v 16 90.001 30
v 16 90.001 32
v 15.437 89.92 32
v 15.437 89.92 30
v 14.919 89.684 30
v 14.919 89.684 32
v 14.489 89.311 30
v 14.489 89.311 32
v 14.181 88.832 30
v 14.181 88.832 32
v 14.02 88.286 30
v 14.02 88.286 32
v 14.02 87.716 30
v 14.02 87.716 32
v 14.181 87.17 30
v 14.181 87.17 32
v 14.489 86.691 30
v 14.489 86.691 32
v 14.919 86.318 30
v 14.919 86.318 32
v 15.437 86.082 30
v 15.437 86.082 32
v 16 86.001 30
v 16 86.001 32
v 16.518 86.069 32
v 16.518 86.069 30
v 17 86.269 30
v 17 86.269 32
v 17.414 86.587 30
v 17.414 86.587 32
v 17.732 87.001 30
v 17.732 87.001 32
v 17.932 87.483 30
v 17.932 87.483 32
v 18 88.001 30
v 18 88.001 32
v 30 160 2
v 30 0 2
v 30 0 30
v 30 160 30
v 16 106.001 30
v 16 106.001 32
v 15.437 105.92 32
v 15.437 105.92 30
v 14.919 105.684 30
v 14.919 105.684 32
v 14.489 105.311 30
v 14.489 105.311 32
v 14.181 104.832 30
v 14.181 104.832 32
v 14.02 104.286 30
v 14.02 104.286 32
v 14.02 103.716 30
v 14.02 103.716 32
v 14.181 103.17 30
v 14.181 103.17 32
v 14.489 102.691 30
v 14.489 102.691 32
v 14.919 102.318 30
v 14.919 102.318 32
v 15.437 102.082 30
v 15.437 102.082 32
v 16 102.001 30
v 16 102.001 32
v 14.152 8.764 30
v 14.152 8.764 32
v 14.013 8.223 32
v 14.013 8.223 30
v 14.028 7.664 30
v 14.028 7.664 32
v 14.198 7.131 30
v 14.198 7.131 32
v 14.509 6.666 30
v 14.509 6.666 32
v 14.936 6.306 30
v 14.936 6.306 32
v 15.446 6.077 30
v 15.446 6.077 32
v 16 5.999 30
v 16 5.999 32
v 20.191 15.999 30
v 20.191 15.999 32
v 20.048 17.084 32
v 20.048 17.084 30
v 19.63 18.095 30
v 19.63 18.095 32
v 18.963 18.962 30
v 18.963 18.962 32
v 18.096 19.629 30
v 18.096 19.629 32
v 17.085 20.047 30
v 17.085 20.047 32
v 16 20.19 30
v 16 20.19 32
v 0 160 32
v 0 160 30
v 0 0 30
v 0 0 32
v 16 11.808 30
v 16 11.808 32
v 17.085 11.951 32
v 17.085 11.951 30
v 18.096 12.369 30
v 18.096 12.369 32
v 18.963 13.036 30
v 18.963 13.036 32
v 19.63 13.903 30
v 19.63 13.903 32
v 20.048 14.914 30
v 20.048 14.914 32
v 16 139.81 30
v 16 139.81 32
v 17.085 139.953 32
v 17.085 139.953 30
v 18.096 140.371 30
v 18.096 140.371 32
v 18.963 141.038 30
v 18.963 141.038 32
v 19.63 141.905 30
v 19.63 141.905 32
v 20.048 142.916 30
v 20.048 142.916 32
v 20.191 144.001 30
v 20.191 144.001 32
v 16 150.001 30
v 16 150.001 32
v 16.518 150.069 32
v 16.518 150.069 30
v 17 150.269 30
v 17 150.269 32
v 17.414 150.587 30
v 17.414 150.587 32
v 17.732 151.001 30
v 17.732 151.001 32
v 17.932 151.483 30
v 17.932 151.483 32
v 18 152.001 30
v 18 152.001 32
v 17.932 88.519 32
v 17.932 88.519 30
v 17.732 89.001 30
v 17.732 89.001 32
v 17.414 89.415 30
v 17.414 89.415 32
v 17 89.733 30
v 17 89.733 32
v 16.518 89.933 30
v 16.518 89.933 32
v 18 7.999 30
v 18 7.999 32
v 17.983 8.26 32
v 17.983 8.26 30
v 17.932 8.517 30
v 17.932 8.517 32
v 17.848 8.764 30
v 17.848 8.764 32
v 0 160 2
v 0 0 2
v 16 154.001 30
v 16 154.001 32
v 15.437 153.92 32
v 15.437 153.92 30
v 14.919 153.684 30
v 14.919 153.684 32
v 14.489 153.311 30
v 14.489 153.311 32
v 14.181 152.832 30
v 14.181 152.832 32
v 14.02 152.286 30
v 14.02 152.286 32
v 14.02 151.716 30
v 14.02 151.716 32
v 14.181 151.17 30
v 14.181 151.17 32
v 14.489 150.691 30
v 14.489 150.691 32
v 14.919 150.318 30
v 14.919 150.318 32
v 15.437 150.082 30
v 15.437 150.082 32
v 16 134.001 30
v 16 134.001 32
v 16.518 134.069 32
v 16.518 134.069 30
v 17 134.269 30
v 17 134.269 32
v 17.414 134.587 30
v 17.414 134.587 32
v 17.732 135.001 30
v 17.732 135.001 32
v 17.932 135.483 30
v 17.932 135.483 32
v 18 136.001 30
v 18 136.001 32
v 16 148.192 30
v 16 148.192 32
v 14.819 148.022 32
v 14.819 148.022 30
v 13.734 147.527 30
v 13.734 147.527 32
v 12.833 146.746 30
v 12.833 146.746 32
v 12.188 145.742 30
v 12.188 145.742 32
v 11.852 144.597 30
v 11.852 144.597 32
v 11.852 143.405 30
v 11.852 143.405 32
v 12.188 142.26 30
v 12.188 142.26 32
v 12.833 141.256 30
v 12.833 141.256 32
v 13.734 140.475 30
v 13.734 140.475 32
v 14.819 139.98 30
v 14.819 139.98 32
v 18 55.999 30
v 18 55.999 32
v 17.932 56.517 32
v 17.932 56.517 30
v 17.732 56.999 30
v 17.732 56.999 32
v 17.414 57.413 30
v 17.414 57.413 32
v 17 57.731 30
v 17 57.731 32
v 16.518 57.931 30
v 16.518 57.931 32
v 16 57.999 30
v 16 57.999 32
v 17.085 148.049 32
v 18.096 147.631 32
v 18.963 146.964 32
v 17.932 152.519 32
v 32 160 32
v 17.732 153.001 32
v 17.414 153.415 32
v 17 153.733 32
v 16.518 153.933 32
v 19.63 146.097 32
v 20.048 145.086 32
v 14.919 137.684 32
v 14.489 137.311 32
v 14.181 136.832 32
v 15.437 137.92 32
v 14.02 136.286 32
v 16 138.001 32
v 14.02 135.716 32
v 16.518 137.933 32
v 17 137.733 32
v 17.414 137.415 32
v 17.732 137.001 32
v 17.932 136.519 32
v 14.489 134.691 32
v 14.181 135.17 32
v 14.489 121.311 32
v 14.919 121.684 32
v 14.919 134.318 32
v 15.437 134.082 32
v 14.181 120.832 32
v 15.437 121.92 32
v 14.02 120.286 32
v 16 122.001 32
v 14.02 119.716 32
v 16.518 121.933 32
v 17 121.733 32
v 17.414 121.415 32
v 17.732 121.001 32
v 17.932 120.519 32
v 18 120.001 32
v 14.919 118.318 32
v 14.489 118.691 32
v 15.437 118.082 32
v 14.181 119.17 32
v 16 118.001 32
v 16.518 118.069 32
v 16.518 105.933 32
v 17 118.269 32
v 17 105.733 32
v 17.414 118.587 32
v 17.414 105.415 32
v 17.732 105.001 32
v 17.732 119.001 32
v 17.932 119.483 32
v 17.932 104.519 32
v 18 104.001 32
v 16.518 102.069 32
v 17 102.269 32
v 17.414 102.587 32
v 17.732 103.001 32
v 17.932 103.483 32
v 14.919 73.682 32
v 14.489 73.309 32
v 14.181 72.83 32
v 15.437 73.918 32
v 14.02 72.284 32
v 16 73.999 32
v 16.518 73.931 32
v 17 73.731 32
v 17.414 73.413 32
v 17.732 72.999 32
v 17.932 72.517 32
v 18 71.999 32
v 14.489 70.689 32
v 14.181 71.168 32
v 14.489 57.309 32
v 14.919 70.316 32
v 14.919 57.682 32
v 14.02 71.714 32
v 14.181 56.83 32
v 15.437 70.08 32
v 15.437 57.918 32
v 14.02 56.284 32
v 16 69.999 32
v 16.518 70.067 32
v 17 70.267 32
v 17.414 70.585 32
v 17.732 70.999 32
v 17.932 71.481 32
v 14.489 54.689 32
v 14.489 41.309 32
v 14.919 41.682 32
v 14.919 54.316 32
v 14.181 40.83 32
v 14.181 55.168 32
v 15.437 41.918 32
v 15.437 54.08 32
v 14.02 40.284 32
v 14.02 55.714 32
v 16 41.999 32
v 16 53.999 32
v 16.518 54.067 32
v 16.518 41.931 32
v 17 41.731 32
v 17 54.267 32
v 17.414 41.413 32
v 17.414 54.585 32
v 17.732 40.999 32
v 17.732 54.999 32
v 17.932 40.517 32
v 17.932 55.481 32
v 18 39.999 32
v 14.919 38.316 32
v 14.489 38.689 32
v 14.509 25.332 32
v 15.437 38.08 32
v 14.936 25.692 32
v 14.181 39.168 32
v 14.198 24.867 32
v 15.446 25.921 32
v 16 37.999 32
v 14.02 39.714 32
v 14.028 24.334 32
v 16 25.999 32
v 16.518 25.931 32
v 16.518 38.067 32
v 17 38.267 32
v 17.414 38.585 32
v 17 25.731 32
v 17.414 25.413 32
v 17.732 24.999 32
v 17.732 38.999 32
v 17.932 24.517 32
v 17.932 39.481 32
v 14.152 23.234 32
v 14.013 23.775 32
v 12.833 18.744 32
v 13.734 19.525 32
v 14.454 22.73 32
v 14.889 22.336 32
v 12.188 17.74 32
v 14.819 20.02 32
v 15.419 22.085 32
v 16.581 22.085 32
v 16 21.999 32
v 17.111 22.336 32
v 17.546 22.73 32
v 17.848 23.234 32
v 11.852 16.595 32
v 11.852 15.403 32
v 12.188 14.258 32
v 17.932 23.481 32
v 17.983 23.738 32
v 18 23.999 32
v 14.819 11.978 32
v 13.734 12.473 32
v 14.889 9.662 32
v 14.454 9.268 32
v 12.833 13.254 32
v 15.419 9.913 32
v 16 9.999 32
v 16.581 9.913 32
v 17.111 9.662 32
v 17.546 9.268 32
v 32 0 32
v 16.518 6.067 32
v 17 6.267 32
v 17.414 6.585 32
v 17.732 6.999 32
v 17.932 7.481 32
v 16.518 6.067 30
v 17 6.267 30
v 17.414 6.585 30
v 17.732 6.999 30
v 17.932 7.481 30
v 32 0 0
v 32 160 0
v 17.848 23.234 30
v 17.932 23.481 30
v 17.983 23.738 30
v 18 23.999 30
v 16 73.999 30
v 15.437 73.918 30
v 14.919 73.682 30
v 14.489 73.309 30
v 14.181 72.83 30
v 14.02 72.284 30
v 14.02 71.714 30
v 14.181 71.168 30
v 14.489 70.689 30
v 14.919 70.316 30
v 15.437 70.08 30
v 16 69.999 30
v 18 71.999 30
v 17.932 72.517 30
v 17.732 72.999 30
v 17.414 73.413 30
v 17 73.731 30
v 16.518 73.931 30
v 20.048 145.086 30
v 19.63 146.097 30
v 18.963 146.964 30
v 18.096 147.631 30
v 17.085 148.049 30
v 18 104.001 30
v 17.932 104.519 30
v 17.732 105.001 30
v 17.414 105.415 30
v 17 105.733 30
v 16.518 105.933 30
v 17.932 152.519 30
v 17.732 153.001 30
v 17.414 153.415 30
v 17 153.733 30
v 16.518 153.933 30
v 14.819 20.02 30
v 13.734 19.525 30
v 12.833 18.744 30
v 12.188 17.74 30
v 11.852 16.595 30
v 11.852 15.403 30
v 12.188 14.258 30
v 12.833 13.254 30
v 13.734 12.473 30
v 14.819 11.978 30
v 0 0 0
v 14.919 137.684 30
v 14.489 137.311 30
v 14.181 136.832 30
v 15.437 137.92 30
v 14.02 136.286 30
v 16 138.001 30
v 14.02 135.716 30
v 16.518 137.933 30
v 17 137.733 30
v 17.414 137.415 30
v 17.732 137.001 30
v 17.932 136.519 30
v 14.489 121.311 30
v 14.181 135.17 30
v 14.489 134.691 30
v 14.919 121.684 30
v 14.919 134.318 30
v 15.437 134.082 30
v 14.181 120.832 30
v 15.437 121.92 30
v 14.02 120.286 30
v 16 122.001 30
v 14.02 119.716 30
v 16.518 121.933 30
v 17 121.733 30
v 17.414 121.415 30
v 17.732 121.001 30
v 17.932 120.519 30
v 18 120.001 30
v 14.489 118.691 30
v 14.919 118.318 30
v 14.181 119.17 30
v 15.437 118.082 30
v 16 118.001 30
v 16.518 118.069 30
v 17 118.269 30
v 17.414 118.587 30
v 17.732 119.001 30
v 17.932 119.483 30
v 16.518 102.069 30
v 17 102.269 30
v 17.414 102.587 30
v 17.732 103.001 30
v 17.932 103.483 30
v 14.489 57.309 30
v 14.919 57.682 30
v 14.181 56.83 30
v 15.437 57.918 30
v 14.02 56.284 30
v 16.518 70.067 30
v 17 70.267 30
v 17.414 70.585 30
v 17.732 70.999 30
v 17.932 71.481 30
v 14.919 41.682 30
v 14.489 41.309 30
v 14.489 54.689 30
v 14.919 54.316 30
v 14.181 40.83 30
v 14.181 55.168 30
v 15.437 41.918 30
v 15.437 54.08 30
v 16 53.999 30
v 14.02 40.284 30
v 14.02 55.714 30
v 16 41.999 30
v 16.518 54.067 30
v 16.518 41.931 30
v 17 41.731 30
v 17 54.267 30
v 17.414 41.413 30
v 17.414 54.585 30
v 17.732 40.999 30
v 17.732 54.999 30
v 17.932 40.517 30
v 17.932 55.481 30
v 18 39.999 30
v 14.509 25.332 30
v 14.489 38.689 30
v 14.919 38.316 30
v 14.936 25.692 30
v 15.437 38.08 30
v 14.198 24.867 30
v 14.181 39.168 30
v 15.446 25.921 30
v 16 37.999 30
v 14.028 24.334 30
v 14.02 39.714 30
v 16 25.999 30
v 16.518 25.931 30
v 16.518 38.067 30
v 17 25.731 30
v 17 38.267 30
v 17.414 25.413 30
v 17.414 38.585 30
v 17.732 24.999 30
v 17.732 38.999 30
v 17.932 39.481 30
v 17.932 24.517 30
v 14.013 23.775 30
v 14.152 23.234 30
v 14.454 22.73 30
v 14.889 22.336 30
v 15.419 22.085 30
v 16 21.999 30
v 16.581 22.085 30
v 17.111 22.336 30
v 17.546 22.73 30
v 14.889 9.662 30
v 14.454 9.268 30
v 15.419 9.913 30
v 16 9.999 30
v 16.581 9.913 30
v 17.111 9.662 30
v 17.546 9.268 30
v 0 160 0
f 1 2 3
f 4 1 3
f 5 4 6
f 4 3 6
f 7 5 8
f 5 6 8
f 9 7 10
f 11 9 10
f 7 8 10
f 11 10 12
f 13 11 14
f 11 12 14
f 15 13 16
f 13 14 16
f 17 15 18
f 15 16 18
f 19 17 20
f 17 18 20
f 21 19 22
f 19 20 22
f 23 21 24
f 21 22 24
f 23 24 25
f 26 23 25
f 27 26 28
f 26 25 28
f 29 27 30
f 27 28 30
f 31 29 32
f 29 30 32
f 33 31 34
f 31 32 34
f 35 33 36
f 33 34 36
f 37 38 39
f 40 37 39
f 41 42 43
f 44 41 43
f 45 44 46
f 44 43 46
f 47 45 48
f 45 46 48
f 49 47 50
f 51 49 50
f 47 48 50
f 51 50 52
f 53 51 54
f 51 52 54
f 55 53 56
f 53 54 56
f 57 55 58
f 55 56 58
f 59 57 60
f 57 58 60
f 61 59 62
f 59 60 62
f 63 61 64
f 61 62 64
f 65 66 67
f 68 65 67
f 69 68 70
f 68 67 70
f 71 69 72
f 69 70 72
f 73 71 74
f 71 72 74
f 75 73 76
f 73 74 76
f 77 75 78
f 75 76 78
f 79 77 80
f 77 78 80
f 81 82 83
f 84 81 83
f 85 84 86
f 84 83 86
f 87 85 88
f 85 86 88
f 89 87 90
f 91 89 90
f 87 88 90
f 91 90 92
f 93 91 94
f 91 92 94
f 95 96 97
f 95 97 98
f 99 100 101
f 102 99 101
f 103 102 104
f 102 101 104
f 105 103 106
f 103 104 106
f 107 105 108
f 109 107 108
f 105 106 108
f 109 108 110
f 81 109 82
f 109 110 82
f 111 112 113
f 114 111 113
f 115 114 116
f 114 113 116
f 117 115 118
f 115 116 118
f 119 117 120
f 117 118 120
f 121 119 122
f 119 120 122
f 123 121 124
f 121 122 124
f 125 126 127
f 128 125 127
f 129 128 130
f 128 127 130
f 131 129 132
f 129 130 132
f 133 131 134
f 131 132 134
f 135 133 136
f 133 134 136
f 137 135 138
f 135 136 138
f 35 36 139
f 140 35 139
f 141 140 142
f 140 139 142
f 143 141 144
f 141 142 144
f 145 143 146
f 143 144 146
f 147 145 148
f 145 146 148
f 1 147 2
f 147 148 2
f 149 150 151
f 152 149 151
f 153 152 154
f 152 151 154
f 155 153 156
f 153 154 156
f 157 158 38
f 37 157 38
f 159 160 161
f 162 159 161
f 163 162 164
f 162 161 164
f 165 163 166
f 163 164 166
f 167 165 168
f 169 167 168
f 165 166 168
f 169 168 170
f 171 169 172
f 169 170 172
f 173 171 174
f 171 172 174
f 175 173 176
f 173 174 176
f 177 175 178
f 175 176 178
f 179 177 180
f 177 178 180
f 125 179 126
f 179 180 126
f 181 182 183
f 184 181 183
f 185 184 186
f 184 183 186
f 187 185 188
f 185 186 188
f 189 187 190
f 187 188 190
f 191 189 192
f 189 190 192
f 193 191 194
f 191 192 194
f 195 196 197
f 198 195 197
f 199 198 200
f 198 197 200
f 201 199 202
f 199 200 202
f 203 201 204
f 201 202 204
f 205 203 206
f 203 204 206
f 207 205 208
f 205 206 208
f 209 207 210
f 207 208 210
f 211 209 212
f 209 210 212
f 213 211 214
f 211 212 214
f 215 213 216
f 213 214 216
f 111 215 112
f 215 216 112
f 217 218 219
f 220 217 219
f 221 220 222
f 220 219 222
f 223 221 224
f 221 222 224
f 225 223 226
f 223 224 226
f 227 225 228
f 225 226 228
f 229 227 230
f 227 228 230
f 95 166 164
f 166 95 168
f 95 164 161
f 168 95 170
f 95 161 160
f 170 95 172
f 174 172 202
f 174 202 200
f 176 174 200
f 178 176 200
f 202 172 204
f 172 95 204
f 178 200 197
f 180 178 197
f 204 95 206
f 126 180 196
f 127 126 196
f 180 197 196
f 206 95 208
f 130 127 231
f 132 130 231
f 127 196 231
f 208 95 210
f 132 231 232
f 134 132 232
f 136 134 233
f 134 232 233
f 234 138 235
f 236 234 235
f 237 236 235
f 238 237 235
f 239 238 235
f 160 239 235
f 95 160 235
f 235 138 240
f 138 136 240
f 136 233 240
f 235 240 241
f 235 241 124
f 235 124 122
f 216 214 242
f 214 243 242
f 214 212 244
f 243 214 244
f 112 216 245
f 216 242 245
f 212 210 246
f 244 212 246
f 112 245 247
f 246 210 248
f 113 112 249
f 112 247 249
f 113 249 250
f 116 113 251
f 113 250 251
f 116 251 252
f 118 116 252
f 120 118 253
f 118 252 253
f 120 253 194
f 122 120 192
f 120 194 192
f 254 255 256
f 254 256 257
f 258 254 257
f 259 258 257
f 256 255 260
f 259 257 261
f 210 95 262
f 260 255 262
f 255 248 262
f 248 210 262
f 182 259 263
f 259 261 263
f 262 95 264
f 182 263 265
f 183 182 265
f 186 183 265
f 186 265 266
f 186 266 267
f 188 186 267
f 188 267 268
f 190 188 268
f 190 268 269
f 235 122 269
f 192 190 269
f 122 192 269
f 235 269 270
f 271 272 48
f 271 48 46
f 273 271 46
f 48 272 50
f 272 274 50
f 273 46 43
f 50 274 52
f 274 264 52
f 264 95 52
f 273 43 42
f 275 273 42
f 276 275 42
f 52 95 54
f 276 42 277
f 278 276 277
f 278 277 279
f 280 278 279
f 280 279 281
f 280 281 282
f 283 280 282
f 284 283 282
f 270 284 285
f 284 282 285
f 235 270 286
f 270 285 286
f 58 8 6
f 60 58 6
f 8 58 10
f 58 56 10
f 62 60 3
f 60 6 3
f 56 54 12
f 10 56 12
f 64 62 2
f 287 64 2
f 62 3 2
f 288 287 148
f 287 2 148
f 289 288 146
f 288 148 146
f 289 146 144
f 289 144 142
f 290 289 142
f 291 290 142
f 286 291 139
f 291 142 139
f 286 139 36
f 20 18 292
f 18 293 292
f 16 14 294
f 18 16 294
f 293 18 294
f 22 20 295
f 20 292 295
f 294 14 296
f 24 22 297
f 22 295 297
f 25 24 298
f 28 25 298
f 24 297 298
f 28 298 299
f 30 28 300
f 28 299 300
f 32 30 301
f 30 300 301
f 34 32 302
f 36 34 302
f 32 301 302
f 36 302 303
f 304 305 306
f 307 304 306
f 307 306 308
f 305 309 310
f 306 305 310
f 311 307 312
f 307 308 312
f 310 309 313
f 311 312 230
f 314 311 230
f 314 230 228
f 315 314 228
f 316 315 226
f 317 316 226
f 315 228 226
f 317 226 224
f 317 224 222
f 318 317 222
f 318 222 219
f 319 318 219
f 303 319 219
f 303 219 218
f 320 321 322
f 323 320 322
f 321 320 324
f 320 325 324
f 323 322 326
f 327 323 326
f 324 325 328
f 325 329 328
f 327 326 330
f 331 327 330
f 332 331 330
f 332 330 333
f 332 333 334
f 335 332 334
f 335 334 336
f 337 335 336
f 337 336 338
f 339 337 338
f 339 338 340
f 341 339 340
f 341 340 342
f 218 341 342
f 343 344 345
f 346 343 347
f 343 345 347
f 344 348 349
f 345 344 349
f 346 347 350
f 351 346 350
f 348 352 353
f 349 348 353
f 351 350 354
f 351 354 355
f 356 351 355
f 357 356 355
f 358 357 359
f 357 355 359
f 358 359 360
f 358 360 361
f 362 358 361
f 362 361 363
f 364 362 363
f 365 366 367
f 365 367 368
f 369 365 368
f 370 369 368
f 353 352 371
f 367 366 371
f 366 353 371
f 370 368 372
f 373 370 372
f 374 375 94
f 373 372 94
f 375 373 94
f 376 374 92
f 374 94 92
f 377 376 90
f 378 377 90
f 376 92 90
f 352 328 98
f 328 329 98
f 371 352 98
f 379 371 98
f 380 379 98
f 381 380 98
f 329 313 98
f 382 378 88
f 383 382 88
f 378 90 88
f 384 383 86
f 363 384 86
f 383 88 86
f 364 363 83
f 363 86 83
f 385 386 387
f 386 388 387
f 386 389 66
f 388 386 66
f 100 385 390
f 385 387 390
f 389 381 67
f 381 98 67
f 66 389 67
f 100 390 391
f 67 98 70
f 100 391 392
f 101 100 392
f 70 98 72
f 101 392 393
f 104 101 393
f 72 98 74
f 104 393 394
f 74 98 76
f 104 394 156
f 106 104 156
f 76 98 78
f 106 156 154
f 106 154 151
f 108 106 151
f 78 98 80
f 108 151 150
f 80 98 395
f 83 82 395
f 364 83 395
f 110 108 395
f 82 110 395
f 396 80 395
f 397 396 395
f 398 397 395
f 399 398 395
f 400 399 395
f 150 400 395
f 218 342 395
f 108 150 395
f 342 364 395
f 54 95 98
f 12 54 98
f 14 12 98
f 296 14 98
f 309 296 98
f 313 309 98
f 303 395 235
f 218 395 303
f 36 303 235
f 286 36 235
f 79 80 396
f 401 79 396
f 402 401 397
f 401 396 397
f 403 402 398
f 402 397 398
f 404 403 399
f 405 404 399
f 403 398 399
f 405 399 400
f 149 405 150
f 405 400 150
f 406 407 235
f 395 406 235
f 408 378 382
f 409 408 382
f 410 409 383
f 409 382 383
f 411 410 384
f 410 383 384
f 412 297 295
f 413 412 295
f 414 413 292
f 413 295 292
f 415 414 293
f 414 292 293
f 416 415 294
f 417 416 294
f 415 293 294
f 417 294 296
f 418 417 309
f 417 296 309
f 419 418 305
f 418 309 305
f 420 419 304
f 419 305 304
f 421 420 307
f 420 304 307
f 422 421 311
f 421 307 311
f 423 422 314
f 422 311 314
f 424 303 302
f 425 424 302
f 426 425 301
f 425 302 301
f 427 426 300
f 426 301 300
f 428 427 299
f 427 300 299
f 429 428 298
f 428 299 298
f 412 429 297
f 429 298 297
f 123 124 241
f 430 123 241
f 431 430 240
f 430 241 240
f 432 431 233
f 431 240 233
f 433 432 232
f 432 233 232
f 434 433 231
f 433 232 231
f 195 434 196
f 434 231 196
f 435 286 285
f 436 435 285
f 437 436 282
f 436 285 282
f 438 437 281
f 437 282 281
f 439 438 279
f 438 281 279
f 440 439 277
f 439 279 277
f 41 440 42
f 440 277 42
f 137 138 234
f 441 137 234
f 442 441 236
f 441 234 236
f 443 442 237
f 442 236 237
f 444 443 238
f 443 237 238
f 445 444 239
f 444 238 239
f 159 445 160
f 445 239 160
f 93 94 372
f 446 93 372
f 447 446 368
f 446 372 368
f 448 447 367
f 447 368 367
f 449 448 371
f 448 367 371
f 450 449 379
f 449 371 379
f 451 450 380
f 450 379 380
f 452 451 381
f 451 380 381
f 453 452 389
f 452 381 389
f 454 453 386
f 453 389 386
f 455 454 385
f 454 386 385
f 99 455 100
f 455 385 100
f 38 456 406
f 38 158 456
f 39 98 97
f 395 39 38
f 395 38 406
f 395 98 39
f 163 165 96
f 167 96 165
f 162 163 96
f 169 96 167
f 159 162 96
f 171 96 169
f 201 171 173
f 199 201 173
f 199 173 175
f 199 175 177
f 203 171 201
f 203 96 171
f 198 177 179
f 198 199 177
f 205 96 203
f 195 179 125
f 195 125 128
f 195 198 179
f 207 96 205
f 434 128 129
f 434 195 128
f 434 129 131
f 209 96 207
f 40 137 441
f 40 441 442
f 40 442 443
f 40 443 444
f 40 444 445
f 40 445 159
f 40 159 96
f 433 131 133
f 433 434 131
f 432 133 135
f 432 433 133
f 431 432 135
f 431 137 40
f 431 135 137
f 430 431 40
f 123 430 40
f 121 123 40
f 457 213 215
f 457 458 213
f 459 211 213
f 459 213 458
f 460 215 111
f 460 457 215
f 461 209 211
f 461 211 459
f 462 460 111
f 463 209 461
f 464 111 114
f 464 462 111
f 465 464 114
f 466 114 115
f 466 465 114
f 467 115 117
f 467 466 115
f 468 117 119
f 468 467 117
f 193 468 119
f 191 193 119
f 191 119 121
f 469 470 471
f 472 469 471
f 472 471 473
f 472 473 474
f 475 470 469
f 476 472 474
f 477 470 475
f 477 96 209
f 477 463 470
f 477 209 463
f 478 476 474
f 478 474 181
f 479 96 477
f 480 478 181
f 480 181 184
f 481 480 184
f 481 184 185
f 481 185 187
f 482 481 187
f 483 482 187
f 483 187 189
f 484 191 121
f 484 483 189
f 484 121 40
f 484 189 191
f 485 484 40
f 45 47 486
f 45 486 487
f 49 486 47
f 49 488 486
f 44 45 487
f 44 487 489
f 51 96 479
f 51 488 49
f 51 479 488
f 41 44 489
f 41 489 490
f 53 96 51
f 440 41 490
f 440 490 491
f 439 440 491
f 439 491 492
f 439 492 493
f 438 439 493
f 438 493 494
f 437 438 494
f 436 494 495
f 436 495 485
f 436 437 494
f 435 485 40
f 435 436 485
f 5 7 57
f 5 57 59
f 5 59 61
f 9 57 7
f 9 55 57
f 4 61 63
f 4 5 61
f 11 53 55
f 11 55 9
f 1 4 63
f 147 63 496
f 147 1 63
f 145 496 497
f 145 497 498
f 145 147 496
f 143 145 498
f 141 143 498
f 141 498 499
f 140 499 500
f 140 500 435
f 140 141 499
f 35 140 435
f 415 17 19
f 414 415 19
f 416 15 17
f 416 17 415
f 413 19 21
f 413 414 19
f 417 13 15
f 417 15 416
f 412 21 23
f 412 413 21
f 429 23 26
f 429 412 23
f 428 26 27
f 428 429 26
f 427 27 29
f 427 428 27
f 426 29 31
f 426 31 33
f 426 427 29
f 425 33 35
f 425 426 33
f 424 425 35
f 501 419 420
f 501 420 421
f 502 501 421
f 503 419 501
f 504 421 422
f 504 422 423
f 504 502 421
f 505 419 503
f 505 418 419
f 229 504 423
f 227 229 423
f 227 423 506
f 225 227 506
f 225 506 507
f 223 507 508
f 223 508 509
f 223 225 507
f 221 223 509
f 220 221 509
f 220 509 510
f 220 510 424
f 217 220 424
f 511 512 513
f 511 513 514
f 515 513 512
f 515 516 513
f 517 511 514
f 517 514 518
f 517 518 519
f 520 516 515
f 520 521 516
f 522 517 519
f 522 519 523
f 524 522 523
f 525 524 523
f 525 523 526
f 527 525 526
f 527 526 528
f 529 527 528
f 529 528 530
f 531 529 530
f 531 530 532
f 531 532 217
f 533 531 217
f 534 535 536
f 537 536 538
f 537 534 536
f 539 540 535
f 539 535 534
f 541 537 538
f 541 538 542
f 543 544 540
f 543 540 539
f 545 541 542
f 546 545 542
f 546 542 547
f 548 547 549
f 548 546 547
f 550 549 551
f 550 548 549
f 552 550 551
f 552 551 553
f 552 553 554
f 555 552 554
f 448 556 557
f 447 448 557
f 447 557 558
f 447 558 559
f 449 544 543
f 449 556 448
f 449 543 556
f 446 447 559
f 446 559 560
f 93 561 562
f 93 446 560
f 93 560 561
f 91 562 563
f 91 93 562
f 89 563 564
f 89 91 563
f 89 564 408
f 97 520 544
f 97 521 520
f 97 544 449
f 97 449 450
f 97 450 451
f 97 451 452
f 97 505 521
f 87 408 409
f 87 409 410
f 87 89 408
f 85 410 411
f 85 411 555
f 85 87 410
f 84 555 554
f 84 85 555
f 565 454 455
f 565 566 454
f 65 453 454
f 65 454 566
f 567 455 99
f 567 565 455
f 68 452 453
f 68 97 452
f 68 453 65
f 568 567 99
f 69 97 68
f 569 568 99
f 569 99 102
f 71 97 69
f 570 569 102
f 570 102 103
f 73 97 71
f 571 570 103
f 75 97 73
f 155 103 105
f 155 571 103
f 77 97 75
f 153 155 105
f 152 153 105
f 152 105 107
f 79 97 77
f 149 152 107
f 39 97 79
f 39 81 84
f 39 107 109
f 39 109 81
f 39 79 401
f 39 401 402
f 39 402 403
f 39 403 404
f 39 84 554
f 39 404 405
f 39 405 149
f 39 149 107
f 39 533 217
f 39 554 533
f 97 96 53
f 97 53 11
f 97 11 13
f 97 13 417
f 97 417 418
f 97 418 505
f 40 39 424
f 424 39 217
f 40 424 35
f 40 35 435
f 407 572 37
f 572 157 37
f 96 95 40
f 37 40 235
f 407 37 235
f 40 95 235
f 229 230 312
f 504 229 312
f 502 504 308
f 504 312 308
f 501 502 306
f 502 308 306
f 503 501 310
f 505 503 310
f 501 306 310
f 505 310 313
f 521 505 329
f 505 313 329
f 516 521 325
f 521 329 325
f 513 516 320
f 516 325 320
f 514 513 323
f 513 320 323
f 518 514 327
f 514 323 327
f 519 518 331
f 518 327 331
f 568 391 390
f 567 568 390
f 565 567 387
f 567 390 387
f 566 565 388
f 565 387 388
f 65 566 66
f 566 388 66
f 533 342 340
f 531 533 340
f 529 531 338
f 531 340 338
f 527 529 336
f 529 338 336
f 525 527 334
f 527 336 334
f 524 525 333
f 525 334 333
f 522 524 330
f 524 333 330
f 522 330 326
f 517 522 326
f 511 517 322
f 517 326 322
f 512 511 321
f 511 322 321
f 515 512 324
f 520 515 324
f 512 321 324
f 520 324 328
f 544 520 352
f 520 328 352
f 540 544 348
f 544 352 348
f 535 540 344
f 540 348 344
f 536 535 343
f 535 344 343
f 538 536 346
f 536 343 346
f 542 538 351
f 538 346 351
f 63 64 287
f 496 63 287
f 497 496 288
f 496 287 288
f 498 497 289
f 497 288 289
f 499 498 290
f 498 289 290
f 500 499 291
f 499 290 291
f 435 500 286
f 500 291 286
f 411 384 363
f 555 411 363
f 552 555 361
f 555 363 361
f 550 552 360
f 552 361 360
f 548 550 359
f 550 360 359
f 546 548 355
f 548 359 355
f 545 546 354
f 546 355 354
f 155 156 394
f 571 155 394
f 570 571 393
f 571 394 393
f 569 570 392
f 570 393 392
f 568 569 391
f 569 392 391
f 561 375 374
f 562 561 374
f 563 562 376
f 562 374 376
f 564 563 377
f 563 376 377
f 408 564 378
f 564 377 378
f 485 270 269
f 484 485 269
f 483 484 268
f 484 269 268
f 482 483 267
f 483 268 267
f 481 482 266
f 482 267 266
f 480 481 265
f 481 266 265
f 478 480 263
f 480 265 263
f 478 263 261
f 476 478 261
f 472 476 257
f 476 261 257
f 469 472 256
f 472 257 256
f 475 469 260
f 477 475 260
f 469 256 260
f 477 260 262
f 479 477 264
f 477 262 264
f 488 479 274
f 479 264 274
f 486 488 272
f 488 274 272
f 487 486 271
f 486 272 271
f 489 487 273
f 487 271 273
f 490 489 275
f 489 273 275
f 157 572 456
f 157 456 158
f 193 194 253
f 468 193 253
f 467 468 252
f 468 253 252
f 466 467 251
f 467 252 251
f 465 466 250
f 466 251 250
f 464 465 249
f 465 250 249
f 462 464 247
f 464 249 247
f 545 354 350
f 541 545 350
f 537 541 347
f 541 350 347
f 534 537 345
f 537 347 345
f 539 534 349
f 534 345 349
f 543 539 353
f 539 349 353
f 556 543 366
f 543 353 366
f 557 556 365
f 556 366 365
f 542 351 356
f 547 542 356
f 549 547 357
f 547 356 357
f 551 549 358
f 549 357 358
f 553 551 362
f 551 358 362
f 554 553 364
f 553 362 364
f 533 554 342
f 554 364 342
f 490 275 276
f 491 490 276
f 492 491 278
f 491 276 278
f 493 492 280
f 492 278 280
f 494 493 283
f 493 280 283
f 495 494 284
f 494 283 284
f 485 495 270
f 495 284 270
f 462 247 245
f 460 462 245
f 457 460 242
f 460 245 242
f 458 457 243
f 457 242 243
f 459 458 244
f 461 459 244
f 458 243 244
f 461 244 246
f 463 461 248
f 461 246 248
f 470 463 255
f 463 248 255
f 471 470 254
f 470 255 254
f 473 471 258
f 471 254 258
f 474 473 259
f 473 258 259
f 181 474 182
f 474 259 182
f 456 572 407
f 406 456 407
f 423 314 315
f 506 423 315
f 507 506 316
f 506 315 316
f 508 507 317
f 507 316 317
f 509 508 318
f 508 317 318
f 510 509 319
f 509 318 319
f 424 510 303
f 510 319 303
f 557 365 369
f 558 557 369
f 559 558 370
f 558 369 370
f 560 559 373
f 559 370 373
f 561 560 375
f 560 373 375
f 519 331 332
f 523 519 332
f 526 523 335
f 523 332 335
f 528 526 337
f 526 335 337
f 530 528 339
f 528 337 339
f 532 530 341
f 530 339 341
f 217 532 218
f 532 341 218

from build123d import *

# Parameters (mm, degrees)
F0_W     = 32
F0_H     = 32
F1_DEPTH = 160
F2_T     = -2
F4_DEPTH = 2


with BuildPart() as f1:
    # F0 (on Front) → F1 (new body)
    with BuildSketch(Plane.XZ):
        with Locations((16, 16)):
            Rectangle(F0_W, F0_H)
    extrude(amount=-F1_DEPTH)

    # F2
    f2_openings = [f1.faces().sort_by_distance(p)[0] for p in [
        (16, 0, 16),
        (0, 80, 16),
        (16, 160, 16),
    ]]
    offset(amount=F2_T, openings=f2_openings)

    # F3 (on face) → F4 (cut, through all)
    with BuildSketch(Plane.XY.offset(32)):
        with BuildLine():
            Line((16, 25.999), (16, 23.999))
            Line((16, 23.999), (17.847759065, 23.2336331353))
            ThreePointArc((17.847759065, 23.2336331353), (17.9615705608, 23.608819356), (18, 23.999))
            ThreePointArc((18, 23.999), (17.4142135624, 25.4132135624), (16, 25.999))
        make_face()
        with BuildLine():
            ThreePointArc((16, 25.999), (14.3370607754, 25.110140466), (14.152240935, 23.2336331353))
            Line((14.152240935, 23.2336331353), (16, 23.999))
            Line((16, 23.999), (16, 25.999))
        make_face()
        with BuildLine():
            ThreePointArc((14.152240935, 23.2336331353), (14.888859534, 22.3360607754), (16, 21.999))
            Line((16, 21.999), (16, 23.999))
            Line((16, 23.999), (14.152240935, 23.2336331353))
        make_face()
        with BuildLine():
            Line((16, 23.999), (16, 21.999))
            ThreePointArc((16, 21.999), (17.111140466, 22.3360607754), (17.847759065, 23.2336331353))
            Line((17.847759065, 23.2336331353), (16, 23.999))
        make_face()
        with BuildLine():
            Line((14.152240935, 8.7643668647), (16, 7.999))
            Line((16, 7.999), (16, 9.999))
            ThreePointArc((16, 9.999), (14.888859534, 9.6619392246), (14.152240935, 8.7643668647))
        make_face()
        with BuildLine():
            Line((16, 9.999), (16, 7.999))
            Line((16, 7.999), (17.847759065, 8.7643668647))
            ThreePointArc((17.847759065, 8.7643668647), (17.111140466, 9.6619392246), (16, 9.999))
        make_face()
        with BuildLine():
            Line((16, 7.999), (16, 5.999))
            ThreePointArc((16, 5.999), (17.4142135624, 6.5847864376), (18, 7.999))
            ThreePointArc((18, 7.999), (17.9615705608, 8.389180644), (17.847759065, 8.7643668647))
            Line((17.847759065, 8.7643668647), (16, 7.999))
        make_face()
        with BuildLine():
            ThreePointArc((14.152240935, 8.7643668647), (14.3370607754, 6.887859534), (16, 5.999))
            Line((16, 5.999), (16, 7.999))
            Line((16, 7.999), (14.152240935, 8.7643668647))
        make_face()
        with BuildLine():
            ThreePointArc((18, 39.999), (17.4142135624, 41.4132135624), (16, 41.999))
            Line((16, 41.999), (16, 39.999))
            Line((16, 39.999), (16, 37.999))
            ThreePointArc((16, 37.999), (17.4142135624, 38.5847864376), (18, 39.999))
        make_face()
        with BuildLine():
            Line((16, 39.999), (16, 41.999))
            ThreePointArc((16, 41.999), (14, 39.999), (16, 37.999))
            Line((16, 37.999), (16, 39.999))
        make_face()
        with BuildLine():
            Line((16, 55.999), (16, 57.999))
            ThreePointArc((16, 57.999), (14, 55.999), (16, 53.999))
            Line((16, 53.999), (16, 55.999))
        make_face()
        with BuildLine():
            ThreePointArc((18, 55.999), (17.4142135624, 57.4132135624), (16, 57.999))
            Line((16, 57.999), (16, 55.999))
            Line((16, 55.999), (16, 53.999))
            ThreePointArc((16, 53.999), (17.4142135624, 54.5847864376), (18, 55.999))
        make_face()
        with BuildLine():
            Line((16, 71.999), (16, 73.999))
            ThreePointArc((16, 73.999), (14, 71.999), (16, 69.999))
            Line((16, 69.999), (16, 71.999))
        make_face()
        with BuildLine():
            ThreePointArc((18, 71.999), (17.4142135624, 73.4132135624), (16, 73.999))
            Line((16, 73.999), (16, 71.999))
            Line((16, 71.999), (16, 69.999))
            ThreePointArc((16, 69.999), (17.4142135624, 70.5847864376), (18, 71.999))
        make_face()
        with BuildLine():
            ThreePointArc((16, 90.001), (14, 88.001), (16, 86.001))
            Line((16, 86.001), (16, 90.001))
        make_face()
        with BuildLine():
            Line((16, 90.001), (16, 86.001))
            ThreePointArc((16, 86.001), (17.4142135624, 86.5867864376), (18, 88.001))
            ThreePointArc((18, 88.001), (17.4142135624, 89.4152135624), (16, 90.001))
        make_face()
        with BuildLine():
            Line((16, 106.001), (16, 102.001))
            ThreePointArc((16, 102.001), (17.4142135624, 102.5867864376), (18, 104.001))
            ThreePointArc((18, 104.001), (17.4142135624, 105.4152135624), (16, 106.001))
        make_face()
        with BuildLine():
            ThreePointArc((16, 106.001), (14, 104.001), (16, 102.001))
            Line((16, 102.001), (16, 106.001))
        make_face()
        with BuildLine():
            ThreePointArc((16, 122.001), (14, 120.001), (16, 118.001))
            Line((16, 118.001), (16, 122.001))
        make_face()
        with BuildLine():
            Line((16, 122.001), (16, 118.001))
            ThreePointArc((16, 118.001), (17.4142135624, 118.5867864376), (18, 120.001))
            ThreePointArc((18, 120.001), (17.4142135624, 121.4152135624), (16, 122.001))
        make_face()
        with BuildLine():
            Line((16, 134.001), (16, 138.001))
            ThreePointArc((16, 138.001), (14, 136.001), (16, 134.001))
        make_face()
        with BuildLine():
            ThreePointArc((18, 136.001), (17.4142135624, 137.4152135624), (16, 138.001))
            Line((16, 138.001), (16, 134.001))
            ThreePointArc((16, 134.001), (17.4142135624, 134.5867864376), (18, 136.001))
        make_face()
        with BuildLine():
            Line((16, 150.001), (16, 154.001))
            ThreePointArc((16, 154.001), (14, 152.001), (16, 150.001))
        make_face()
        with BuildLine():
            ThreePointArc((18, 152.001), (17.4142135624, 153.4152135624), (16, 154.001))
            Line((16, 154.001), (16, 150.001))
            ThreePointArc((16, 150.001), (17.4142135624, 150.5867864376), (18, 152.001))
        make_face()
        with BuildLine():
            ThreePointArc((16, 20.19), (11.809, 15.999), (16, 11.808))
            Line((16, 11.808), (16, 20.19))
        make_face()
        with BuildLine():
            Line((16, 20.19), (16, 11.808))
            ThreePointArc((16, 11.808), (18.96348452, 13.03551548), (20.191, 15.999))
            ThreePointArc((20.191, 15.999), (18.96348452, 18.96248452), (16, 20.19))
        make_face()
        with BuildLine():
            Line((16, 139.81), (16, 148.192))
            ThreePointArc((16, 148.192), (11.809, 144.001), (16, 139.81))
        make_face()
        with BuildLine():
            ThreePointArc((20.191, 144.001), (18.96348452, 146.96448452), (16, 148.192))
            Line((16, 148.192), (16, 139.81))
            ThreePointArc((16, 139.81), (18.96348452, 141.03751548), (20.191, 144.001))
        make_face()
    extrude(amount=-F4_DEPTH, mode=Mode.SUBTRACT)


solid = f1.part
